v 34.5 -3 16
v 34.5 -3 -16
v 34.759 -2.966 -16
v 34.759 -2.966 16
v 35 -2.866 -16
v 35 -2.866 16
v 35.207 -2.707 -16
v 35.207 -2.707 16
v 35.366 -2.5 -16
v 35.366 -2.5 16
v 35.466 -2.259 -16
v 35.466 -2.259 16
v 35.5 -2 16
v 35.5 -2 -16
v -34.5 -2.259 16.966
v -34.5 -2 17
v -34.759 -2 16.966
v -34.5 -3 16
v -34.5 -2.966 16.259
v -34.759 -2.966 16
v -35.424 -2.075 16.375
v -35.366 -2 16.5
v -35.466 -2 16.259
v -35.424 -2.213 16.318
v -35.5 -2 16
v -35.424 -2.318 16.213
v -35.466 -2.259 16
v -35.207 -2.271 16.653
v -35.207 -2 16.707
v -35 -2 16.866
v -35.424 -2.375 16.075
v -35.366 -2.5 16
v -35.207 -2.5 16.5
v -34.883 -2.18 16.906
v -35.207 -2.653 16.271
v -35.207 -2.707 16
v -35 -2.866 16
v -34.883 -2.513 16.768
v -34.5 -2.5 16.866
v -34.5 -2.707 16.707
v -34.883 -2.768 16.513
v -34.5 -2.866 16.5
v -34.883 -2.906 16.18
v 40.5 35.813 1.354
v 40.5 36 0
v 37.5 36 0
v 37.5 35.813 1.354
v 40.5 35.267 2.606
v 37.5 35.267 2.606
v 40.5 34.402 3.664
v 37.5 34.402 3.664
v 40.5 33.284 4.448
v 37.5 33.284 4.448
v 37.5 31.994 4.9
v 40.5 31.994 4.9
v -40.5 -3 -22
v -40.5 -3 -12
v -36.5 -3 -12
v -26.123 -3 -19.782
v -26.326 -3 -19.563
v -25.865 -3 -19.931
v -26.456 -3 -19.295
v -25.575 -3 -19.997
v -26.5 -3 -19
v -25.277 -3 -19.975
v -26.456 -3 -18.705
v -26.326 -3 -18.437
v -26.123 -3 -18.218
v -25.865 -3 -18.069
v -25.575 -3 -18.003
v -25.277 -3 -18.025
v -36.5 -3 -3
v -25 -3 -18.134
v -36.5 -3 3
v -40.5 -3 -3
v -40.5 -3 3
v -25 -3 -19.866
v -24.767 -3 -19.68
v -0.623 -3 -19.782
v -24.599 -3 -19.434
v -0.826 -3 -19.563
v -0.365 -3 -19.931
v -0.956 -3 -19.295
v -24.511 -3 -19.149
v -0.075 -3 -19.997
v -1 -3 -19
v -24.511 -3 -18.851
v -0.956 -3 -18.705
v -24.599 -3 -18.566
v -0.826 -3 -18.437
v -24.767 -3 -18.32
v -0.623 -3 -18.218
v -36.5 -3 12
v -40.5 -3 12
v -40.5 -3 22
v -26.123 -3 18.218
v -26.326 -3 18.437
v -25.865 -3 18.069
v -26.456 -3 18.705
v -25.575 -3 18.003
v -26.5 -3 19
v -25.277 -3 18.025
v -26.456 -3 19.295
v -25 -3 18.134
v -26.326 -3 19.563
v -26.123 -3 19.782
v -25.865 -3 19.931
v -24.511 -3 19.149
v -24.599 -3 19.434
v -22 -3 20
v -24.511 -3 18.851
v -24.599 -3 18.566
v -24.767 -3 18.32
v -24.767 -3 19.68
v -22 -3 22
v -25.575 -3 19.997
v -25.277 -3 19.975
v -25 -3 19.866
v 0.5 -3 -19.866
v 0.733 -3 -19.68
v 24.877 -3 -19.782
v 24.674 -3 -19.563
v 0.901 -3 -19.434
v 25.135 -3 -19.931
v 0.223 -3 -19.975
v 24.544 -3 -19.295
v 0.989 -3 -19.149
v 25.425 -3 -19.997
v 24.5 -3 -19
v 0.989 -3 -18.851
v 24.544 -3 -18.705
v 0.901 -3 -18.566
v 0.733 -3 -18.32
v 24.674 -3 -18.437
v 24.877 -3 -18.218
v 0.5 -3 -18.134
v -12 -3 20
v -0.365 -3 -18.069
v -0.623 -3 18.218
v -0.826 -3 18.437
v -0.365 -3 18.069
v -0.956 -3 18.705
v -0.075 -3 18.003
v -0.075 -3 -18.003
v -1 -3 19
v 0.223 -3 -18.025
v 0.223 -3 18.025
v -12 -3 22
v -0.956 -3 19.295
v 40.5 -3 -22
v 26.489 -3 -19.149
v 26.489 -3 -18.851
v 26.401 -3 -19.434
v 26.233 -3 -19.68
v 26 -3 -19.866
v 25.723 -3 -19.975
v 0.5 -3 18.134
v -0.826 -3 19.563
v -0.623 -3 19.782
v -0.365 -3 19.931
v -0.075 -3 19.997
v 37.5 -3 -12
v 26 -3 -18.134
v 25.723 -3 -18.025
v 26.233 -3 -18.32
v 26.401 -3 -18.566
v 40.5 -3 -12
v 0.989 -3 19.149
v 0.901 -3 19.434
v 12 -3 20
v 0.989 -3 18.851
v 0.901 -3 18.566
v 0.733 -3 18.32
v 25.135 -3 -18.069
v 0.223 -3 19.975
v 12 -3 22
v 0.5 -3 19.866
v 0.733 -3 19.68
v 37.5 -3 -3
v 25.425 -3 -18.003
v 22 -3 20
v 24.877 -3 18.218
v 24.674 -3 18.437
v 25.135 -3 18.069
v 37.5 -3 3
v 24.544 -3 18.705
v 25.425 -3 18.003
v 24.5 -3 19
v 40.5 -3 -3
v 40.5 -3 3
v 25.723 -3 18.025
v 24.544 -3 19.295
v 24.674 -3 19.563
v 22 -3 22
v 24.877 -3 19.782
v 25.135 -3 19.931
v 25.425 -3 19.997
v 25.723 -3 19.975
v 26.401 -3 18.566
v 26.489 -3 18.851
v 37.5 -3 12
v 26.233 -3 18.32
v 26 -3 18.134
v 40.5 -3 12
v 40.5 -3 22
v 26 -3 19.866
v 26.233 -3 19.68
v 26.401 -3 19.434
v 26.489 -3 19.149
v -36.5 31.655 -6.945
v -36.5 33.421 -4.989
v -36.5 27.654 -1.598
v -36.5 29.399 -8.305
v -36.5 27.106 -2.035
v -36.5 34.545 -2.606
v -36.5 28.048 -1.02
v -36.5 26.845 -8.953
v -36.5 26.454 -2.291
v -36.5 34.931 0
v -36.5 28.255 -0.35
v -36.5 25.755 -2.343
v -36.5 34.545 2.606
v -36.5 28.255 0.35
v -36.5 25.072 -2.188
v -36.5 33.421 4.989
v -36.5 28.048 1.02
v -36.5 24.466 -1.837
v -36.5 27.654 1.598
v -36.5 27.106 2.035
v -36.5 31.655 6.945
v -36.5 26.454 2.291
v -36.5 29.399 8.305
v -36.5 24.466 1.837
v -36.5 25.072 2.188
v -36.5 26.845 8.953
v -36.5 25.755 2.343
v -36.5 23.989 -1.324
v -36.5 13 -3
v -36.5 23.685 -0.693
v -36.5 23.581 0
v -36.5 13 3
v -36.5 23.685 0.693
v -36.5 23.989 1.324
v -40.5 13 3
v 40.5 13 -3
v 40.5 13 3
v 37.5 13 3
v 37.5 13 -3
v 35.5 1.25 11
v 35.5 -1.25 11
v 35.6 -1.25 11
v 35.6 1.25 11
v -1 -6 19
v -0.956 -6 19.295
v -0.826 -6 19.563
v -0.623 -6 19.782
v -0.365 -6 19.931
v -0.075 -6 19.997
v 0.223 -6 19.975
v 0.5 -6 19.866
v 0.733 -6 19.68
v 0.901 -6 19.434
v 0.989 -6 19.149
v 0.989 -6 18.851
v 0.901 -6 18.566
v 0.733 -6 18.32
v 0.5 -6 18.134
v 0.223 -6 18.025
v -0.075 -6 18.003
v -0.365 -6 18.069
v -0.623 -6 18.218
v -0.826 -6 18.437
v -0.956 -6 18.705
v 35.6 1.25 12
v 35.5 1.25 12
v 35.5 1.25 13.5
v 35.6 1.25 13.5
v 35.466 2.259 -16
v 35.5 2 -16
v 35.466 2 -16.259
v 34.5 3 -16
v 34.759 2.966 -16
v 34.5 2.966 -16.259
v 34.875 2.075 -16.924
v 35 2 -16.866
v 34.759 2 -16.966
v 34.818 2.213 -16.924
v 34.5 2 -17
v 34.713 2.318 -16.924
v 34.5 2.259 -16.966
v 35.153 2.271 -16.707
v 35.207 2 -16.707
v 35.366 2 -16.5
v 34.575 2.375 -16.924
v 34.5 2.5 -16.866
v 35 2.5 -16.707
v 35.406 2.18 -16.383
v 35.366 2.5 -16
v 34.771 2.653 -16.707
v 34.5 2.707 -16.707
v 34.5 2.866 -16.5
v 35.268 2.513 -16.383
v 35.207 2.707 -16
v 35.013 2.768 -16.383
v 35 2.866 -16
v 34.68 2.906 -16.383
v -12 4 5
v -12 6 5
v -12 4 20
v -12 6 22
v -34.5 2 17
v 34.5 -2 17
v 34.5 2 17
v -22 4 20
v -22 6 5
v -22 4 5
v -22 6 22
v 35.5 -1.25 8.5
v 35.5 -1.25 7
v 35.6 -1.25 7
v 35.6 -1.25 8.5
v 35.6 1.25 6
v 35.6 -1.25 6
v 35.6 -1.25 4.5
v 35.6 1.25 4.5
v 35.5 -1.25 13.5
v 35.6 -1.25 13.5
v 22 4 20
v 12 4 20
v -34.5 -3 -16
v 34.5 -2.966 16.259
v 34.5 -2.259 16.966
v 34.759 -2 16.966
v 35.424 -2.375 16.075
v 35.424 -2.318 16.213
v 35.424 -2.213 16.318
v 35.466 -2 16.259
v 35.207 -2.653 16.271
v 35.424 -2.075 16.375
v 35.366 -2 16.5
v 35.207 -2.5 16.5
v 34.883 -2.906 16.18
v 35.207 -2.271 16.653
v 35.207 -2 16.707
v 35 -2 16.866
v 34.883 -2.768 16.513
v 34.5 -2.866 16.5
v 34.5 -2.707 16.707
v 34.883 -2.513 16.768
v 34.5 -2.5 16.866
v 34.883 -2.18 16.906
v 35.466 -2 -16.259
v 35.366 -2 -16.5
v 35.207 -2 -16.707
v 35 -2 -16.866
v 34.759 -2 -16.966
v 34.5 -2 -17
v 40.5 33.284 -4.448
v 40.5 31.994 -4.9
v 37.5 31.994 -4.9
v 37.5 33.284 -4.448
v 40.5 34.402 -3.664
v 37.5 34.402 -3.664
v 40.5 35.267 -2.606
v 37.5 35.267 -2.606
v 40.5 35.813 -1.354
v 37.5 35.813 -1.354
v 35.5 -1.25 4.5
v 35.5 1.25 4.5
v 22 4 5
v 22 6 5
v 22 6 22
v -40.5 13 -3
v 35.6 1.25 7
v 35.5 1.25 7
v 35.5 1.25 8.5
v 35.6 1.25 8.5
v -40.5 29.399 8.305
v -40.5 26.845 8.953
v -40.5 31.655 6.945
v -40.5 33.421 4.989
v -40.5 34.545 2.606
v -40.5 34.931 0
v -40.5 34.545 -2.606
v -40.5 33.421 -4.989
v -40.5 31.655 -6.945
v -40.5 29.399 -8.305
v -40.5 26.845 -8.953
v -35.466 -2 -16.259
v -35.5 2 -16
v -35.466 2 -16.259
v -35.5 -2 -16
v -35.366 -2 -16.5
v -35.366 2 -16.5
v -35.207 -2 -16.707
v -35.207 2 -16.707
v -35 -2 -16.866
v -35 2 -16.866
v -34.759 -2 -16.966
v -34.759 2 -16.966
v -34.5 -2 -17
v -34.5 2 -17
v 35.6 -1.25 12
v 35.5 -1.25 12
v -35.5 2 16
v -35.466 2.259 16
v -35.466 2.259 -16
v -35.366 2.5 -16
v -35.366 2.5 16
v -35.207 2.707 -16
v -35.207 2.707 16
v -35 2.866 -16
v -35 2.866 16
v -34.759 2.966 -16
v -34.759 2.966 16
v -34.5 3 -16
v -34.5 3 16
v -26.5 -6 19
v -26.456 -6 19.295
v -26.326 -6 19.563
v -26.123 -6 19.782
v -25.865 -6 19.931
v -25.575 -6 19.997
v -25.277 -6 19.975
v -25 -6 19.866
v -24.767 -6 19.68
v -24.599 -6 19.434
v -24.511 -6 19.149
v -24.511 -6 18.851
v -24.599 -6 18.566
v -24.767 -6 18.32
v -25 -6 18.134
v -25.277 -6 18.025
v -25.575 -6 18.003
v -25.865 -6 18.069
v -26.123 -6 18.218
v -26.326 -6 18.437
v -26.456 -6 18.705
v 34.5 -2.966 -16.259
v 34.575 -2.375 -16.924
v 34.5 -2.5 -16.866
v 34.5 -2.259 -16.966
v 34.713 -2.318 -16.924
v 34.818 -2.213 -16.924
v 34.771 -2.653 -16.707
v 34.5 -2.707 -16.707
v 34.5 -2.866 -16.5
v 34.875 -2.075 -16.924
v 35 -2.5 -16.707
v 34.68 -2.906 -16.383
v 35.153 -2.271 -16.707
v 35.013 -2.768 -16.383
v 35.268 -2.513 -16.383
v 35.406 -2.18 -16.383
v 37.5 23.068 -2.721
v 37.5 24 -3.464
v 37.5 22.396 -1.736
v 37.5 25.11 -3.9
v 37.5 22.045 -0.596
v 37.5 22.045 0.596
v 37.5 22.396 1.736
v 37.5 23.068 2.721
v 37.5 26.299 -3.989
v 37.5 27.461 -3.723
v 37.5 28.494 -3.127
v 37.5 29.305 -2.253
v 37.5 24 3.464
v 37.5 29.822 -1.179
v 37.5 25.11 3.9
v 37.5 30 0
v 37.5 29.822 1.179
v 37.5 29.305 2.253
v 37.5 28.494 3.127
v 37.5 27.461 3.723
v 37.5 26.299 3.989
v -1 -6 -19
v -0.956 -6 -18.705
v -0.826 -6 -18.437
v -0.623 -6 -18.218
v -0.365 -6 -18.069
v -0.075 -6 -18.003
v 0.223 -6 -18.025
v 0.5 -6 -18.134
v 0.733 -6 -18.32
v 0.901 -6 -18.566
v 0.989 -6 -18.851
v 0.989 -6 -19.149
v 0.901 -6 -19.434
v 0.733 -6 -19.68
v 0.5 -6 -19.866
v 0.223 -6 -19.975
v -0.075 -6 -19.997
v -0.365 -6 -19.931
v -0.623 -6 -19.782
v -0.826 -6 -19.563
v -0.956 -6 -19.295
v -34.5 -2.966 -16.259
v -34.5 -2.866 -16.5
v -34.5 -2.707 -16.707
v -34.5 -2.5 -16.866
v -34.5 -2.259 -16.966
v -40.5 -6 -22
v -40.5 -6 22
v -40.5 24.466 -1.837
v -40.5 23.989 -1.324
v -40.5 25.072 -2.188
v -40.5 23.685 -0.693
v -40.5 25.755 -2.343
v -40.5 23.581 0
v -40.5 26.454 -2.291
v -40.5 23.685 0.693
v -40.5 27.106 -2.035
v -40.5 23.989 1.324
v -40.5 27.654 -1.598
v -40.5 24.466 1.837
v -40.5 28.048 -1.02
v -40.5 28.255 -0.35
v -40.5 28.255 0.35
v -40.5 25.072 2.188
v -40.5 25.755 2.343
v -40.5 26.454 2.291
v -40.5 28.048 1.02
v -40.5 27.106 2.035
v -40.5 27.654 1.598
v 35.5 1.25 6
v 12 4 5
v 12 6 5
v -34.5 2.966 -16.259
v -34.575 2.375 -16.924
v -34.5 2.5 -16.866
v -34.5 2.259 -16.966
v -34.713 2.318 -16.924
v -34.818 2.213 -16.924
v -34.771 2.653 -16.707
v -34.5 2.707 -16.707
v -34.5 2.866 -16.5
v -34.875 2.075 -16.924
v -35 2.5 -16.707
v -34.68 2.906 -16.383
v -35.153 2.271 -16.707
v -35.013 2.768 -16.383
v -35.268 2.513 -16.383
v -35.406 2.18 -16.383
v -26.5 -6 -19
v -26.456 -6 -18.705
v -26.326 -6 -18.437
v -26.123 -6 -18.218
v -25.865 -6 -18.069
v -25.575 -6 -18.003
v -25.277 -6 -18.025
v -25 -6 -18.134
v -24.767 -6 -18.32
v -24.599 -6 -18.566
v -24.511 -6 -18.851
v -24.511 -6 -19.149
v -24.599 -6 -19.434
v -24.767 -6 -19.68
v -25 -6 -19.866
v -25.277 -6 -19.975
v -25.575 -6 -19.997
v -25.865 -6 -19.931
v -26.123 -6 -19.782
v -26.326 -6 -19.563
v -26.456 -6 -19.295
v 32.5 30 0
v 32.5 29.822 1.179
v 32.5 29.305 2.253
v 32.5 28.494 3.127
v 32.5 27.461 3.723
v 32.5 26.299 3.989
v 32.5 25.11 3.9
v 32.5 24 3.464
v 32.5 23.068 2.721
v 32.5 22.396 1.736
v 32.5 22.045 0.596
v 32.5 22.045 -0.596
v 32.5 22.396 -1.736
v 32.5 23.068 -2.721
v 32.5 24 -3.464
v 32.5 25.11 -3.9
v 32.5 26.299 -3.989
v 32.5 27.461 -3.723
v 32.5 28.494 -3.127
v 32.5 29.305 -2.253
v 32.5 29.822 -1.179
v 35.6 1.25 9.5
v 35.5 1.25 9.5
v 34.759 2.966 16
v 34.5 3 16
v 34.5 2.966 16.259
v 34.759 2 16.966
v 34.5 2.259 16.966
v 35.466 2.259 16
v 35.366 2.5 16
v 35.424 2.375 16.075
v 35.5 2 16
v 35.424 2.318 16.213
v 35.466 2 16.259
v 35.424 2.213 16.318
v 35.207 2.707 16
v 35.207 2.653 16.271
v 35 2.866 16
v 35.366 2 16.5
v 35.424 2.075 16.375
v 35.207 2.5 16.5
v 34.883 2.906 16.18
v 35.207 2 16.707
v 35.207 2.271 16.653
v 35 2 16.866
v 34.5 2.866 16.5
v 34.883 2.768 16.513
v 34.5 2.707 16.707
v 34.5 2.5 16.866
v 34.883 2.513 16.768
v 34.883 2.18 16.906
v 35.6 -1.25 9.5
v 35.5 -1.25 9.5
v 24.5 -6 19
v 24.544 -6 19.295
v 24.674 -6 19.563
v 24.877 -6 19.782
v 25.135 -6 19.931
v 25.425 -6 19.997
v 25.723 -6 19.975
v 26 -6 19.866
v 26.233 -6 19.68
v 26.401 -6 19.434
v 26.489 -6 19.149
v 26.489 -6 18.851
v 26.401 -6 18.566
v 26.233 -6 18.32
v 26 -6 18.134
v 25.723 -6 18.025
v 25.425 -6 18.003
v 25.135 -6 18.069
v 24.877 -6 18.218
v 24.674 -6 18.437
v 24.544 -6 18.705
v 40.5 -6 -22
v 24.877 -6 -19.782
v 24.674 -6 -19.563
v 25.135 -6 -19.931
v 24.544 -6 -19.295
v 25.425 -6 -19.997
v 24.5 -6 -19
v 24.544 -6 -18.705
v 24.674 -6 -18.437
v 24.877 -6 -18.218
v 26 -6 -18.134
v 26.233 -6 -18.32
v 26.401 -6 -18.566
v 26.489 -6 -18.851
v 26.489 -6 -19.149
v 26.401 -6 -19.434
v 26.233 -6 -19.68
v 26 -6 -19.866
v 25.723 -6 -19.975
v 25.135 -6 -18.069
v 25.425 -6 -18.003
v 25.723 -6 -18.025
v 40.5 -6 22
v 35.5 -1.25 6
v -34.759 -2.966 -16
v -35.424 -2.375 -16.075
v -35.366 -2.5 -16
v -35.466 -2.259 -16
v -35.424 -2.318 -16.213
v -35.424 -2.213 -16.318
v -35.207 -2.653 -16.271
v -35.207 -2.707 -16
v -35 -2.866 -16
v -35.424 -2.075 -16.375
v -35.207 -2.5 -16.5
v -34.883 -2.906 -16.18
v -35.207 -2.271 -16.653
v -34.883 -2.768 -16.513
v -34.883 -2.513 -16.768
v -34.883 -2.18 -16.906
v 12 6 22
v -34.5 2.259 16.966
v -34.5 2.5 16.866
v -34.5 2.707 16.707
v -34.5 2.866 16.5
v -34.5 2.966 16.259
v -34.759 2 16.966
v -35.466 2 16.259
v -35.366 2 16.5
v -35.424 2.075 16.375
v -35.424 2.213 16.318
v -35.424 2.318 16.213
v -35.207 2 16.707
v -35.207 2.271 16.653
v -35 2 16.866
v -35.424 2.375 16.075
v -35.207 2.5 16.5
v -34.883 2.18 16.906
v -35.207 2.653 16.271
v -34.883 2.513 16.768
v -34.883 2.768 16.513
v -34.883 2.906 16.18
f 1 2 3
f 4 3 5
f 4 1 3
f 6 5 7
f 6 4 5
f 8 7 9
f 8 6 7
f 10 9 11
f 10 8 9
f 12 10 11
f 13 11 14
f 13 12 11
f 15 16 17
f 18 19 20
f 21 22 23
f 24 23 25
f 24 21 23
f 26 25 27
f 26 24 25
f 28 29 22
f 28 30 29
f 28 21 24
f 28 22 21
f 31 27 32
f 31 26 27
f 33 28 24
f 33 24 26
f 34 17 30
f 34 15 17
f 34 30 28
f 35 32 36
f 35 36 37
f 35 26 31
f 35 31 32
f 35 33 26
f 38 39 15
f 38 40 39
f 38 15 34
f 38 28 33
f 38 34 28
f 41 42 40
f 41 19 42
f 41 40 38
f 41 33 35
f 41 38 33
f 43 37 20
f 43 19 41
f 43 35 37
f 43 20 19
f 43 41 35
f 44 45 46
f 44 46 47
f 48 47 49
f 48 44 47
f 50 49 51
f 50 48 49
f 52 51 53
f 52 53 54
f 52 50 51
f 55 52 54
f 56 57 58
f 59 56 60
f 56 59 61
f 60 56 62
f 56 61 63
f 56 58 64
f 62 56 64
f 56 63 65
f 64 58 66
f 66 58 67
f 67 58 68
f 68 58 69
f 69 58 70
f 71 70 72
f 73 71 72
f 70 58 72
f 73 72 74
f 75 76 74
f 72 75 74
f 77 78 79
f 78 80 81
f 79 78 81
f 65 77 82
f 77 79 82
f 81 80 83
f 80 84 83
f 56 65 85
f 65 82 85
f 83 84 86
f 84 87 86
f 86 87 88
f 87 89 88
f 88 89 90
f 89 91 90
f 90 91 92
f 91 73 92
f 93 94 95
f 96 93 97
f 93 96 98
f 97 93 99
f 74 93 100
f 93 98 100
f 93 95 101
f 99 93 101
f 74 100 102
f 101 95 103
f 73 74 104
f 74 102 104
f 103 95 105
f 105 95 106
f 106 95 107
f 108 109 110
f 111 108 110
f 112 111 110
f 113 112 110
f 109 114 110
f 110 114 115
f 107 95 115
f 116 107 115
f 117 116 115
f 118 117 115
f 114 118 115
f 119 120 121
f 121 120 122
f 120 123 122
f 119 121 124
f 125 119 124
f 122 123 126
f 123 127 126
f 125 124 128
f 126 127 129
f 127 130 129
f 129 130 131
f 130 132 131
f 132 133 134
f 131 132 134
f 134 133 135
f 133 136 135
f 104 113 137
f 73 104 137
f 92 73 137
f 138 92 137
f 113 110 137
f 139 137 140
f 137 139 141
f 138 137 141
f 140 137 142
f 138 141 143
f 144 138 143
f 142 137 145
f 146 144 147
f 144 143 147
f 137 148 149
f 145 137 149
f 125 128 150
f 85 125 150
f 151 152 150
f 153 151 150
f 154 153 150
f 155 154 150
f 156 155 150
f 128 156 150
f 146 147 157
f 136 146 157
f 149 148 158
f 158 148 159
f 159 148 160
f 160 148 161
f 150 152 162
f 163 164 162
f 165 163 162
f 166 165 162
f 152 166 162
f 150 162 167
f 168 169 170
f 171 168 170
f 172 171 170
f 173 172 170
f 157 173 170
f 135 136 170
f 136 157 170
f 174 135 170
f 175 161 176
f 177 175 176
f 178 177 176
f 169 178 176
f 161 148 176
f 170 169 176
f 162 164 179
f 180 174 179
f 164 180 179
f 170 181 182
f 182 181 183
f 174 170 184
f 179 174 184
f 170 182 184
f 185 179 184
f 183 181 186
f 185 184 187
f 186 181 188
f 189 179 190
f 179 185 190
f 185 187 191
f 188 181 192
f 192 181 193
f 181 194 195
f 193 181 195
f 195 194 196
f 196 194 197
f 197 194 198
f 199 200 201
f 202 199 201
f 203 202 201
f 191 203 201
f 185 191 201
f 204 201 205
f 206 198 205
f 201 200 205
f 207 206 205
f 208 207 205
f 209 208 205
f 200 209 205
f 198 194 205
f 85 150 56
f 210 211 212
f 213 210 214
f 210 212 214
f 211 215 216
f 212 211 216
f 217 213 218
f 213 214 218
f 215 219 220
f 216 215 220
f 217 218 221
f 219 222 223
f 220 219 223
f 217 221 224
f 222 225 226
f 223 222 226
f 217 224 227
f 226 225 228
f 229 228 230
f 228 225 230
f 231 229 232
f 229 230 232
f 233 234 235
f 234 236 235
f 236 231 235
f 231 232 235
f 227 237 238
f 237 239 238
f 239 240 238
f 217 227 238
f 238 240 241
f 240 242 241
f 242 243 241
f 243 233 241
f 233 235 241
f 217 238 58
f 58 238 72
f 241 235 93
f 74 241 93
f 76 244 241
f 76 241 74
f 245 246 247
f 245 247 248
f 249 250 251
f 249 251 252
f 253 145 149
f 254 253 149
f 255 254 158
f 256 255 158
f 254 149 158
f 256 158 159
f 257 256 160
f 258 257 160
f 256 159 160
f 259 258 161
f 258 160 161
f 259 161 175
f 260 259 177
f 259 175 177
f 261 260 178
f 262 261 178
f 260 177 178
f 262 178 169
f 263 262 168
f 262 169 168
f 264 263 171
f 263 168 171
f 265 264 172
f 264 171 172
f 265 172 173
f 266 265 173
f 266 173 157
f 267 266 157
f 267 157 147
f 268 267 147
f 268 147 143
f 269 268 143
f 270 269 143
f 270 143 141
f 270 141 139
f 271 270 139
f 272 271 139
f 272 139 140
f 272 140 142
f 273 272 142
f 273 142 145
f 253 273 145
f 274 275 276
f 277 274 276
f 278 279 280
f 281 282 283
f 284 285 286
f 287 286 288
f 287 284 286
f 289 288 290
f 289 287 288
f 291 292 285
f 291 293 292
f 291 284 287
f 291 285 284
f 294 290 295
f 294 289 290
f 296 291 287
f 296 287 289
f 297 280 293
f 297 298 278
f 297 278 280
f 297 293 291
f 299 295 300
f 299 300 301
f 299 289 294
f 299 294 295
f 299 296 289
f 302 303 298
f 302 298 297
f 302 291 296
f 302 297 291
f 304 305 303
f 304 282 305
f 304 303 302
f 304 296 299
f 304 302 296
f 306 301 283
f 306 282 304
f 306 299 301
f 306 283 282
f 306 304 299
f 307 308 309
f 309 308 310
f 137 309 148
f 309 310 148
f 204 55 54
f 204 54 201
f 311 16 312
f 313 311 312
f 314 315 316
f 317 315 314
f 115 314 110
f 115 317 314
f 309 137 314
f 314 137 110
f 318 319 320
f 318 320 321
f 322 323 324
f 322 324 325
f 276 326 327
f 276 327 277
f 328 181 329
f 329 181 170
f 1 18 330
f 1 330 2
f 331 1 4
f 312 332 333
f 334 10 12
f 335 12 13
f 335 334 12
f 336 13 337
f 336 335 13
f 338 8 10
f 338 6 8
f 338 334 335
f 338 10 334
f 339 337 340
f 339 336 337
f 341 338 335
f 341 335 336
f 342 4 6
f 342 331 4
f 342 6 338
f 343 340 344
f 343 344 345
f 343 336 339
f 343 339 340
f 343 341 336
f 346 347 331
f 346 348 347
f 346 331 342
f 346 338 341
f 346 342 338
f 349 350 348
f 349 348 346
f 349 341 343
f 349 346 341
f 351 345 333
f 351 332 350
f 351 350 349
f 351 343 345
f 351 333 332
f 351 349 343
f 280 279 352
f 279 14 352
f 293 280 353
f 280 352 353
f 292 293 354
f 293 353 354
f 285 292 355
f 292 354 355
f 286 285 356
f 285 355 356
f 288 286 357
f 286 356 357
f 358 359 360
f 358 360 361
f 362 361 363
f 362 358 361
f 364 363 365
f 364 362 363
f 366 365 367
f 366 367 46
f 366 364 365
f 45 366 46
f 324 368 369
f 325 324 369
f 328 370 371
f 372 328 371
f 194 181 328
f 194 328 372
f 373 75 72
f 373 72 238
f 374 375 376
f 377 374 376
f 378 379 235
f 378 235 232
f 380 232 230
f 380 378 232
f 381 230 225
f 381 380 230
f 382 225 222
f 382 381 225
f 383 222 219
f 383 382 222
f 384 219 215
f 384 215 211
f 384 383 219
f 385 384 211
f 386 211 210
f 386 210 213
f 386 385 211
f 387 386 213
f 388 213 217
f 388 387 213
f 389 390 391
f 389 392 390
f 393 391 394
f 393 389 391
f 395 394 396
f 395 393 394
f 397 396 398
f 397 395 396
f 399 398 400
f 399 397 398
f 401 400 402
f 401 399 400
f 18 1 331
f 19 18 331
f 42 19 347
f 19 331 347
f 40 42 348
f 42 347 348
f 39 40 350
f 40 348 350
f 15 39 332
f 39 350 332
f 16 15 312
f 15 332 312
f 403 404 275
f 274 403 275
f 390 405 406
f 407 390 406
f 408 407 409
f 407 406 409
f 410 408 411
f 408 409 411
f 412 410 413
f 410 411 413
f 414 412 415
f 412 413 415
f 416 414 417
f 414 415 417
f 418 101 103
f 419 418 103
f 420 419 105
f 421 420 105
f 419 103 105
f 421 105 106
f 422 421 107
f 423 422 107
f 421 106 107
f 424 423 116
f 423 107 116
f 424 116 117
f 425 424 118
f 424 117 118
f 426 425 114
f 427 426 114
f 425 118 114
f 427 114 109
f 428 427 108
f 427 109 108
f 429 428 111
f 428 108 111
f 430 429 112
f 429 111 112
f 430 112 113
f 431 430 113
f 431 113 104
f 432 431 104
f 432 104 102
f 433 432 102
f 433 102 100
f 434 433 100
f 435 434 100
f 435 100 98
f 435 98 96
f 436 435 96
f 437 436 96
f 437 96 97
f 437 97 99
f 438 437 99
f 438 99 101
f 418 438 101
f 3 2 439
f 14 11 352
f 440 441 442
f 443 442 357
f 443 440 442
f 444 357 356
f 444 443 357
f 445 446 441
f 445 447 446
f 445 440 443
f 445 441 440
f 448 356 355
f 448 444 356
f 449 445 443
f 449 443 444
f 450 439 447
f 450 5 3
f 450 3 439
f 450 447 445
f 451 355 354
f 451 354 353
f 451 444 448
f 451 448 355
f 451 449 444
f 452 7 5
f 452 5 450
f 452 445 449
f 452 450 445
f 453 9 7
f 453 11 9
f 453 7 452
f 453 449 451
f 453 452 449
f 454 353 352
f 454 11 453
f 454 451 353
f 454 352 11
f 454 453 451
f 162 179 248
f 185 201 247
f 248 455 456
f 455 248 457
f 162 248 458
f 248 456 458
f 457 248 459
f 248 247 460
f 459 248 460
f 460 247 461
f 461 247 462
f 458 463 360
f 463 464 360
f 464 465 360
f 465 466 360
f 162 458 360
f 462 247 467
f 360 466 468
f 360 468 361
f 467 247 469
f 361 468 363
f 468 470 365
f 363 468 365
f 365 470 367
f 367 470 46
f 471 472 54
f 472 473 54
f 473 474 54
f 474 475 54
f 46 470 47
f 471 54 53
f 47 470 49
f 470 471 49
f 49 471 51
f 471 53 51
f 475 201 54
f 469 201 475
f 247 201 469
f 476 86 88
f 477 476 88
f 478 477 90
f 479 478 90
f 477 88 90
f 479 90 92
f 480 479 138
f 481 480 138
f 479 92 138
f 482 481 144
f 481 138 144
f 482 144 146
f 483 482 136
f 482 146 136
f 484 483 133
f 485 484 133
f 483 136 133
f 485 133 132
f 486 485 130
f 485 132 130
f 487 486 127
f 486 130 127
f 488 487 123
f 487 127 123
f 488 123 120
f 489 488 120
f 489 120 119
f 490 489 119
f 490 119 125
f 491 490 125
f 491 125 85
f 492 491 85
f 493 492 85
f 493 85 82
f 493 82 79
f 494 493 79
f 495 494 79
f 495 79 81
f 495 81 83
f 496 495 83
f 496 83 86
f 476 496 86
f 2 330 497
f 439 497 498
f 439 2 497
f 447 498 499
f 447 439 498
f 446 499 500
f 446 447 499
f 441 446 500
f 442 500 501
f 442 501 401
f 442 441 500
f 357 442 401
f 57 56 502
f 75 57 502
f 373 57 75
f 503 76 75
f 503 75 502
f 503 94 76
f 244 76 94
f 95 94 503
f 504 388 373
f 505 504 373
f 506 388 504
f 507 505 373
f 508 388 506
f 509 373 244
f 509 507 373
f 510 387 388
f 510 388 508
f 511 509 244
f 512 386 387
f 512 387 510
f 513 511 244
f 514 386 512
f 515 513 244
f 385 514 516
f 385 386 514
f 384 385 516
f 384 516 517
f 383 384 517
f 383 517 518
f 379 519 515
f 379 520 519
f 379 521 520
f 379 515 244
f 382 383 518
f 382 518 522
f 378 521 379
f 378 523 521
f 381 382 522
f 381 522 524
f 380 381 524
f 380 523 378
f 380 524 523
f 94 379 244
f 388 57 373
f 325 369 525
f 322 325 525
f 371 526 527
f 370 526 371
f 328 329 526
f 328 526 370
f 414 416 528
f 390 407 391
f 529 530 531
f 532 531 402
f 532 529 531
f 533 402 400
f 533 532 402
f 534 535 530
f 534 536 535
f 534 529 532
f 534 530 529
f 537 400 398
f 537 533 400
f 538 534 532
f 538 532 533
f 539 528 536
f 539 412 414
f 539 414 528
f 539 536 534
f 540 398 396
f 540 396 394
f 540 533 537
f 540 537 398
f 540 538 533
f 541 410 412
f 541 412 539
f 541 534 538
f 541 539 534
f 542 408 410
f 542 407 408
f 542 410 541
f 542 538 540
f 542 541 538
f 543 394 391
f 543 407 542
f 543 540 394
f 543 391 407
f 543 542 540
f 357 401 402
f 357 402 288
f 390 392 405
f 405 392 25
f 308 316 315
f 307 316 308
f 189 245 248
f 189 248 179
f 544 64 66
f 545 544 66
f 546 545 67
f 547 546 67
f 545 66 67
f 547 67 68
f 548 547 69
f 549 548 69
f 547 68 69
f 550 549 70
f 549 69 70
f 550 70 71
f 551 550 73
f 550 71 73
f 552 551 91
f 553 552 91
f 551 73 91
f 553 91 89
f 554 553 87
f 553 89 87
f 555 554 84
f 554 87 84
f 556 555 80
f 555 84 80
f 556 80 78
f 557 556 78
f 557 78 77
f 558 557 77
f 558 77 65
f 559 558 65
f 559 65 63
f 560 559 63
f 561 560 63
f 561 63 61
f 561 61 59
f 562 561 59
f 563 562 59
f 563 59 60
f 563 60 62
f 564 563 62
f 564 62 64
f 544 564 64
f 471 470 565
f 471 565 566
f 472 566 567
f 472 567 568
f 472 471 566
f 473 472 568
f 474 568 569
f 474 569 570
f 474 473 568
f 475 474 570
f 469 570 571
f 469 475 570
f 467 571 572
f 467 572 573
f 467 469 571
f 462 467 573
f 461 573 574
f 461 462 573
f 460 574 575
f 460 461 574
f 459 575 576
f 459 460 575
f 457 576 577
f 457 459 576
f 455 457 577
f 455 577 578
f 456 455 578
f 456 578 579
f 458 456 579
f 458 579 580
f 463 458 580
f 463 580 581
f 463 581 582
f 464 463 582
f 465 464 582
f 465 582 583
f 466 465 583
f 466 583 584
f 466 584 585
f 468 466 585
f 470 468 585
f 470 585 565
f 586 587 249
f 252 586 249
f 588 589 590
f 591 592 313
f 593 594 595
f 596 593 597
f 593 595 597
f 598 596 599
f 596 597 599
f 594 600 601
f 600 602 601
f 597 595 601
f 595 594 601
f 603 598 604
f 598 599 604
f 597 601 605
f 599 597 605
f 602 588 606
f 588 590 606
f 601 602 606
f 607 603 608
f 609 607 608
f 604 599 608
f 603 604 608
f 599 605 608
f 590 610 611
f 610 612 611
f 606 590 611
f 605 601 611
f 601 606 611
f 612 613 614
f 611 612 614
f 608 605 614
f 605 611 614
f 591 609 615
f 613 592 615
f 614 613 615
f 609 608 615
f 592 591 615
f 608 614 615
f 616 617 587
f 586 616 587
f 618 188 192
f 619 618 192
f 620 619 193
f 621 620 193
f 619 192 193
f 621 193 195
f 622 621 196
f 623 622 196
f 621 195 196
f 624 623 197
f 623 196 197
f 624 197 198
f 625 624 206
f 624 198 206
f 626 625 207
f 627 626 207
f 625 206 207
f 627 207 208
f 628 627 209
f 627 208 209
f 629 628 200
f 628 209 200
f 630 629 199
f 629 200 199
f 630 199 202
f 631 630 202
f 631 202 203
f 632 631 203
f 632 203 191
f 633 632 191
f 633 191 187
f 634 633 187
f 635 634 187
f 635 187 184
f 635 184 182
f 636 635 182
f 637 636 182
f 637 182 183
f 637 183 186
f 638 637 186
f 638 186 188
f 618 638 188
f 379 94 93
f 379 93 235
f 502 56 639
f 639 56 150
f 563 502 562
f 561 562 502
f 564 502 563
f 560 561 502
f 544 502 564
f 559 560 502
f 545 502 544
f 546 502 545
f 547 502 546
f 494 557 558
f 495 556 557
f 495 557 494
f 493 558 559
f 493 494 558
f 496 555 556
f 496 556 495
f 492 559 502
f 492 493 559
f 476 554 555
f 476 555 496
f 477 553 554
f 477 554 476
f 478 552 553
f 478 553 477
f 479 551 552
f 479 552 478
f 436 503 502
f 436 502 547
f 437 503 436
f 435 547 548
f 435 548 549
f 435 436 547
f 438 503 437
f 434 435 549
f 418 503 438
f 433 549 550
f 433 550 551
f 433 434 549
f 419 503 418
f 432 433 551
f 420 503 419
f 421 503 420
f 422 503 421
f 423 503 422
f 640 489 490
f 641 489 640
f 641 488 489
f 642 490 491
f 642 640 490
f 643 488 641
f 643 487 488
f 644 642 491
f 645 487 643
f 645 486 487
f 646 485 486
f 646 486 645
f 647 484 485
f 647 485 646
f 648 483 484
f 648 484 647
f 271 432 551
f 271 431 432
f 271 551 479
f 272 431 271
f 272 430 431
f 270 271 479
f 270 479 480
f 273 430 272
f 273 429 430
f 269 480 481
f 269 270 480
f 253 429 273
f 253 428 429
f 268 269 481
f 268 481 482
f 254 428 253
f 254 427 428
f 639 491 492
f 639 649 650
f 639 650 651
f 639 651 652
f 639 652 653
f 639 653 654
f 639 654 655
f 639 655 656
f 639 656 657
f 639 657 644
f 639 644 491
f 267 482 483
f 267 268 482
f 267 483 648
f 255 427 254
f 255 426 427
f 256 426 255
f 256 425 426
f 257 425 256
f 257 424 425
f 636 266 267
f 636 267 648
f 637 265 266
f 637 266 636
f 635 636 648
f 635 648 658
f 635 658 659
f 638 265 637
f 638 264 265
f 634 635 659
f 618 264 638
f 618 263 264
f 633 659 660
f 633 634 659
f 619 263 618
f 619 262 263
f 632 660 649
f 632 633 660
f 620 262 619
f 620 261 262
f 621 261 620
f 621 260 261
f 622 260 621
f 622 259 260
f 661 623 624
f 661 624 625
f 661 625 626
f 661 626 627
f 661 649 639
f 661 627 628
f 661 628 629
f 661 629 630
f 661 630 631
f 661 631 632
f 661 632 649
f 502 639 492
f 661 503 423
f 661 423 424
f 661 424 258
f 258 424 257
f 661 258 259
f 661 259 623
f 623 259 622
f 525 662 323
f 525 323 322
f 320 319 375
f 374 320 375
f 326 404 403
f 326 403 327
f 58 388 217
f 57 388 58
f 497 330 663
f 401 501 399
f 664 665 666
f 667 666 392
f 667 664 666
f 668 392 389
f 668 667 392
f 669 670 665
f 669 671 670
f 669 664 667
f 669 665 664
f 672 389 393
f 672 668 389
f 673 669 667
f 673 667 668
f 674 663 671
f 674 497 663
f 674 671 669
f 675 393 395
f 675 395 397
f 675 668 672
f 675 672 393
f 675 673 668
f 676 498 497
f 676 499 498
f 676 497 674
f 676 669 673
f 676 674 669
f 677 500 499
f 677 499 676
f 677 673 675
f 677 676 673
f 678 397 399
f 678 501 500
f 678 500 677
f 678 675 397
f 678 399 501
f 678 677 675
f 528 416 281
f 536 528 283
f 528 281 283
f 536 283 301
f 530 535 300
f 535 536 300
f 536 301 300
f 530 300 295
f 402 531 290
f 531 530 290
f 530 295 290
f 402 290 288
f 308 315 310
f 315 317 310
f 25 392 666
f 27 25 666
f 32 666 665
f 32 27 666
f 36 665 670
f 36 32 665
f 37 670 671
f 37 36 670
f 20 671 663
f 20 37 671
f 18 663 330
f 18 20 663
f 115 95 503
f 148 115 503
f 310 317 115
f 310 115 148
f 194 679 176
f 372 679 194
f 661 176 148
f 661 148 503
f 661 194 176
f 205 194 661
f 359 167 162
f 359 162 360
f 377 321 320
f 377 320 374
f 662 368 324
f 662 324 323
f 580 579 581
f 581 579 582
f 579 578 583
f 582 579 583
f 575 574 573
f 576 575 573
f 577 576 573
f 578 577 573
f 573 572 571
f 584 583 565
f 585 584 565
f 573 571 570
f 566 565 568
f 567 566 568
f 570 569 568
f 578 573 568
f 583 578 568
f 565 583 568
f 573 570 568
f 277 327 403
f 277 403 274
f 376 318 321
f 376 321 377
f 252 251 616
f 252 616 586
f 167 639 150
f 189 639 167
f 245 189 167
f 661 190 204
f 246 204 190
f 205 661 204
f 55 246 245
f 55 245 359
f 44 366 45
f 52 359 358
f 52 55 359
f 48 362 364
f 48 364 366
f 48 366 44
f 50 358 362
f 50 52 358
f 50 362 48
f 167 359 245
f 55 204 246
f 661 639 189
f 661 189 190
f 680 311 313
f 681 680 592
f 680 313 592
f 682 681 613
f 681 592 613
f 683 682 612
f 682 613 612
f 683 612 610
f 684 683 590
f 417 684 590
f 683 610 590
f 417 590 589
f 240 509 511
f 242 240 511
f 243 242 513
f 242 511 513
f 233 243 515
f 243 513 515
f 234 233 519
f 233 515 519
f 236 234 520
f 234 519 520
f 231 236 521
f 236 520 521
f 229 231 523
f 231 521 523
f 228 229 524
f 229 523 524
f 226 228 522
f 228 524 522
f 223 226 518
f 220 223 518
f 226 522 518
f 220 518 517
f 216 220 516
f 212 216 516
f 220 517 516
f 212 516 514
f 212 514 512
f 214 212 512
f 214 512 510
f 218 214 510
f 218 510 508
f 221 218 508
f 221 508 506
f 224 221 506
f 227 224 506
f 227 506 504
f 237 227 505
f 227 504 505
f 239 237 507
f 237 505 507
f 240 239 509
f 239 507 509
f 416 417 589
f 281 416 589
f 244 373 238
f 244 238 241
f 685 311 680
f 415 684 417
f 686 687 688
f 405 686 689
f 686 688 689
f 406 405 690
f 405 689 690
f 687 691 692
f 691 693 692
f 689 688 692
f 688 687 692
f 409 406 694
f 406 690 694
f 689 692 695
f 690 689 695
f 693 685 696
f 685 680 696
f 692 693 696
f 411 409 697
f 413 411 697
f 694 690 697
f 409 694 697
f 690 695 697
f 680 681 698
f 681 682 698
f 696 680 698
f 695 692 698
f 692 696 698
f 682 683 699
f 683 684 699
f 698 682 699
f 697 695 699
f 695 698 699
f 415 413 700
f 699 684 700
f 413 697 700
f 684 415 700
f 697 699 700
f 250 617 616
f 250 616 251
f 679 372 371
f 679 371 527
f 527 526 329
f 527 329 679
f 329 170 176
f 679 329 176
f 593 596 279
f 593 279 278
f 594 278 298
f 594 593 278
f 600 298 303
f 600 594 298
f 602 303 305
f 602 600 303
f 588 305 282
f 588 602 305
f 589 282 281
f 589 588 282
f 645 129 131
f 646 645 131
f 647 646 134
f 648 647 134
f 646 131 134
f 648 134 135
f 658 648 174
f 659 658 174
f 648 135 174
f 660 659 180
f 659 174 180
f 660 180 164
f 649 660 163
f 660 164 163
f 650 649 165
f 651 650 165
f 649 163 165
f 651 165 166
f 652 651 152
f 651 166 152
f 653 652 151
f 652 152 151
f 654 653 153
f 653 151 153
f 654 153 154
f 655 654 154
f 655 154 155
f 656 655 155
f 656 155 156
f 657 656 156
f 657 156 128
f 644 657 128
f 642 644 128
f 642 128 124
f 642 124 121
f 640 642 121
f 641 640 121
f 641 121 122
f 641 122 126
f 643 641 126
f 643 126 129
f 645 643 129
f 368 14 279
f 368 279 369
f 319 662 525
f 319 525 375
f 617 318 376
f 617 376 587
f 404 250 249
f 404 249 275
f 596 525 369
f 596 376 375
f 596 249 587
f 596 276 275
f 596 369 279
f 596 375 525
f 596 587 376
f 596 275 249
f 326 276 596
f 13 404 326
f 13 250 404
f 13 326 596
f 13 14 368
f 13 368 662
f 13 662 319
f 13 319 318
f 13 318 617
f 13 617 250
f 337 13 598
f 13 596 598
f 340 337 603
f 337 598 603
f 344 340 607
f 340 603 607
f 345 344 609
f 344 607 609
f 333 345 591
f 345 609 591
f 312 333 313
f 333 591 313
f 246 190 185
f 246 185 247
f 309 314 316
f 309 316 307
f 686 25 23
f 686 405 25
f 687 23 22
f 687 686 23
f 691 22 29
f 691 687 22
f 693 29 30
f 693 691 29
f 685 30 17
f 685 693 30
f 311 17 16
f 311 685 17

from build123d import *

# Parameters (mm, degrees)
F0_W      = 71
F0_H      = 34
F1_DEPTH  = 3
F2_R      = 1
F3_W      = 2.5
F3_H      = 1.5
F4_DEPTH  = 0.1
F5_W      = 81
F5_H      = 44
F6_DEPTH  = 3
F7_R      = 2.35
F8_DEPTH  = 4
F10_DEPTH = 3
F11_R     = 4
F12_DEPTH = 8
F13_W     = 10
F13_H     = 2
F14_DEPTH = 9
F15_W     = 10
F15_H     = 2
F16_DEPTH = 15
F17_R     = 1
F18_DEPTH = 25


with BuildPart() as f1:
    # F0 (on Front) → F1 (new body, symmetric)
    with BuildSketch(Plane.XZ):
        Rectangle(F0_W, F0_H)
    extrude(amount=F1_DEPTH, both=True)

    # F2
    f2_edges = [f1.edges().sort_by_distance(p)[0] for p in [
        (0, -3, 17),
        (0, 3, 17),
        (35.5, -3, 0),
        (35.5, 3, 0),
        (0, -3, -17),
        (35.5, 0, -17),
        (-35.5, 0, 17),
        (-35.5, -3, 0),
        (-35.5, 3, 0),
        (0, 3, -17),
        (-35.5, 0, -17),
        (35.5, 0, 17),
    ]]
    fillet(f2_edges, radius=F2_R)

    # F3 (on face) → F4 (join)
    with BuildSketch(Plane.YZ.offset(35.5)):
        with Locations((0, 12.75)):
            Rectangle(F3_W, F3_H)
        with Locations((0, 10.25)):
            Rectangle(F3_W, F3_H)
        with Locations((0, 7.75)):
            Rectangle(F3_W, F3_H)
        with Locations((0, 5.25)):
            Rectangle(F3_W, F3_H)
    extrude(amount=F4_DEPTH)


with BuildPart() as f6:
    # F5 (on face) → F6 (new body)
    with BuildSketch(Plane.XZ.offset(3)):
        Rectangle(F5_W, F5_H)
    extrude(amount=F6_DEPTH)

    # F7 (on face) → F8 (join)
    with BuildSketch(Plane(origin=(-40.5, 0, 0), x_dir=(0, -1, 0), z_dir=(-1, 0, 0))):
        with BuildLine():
            ThreePointArc((-26.84491, -8.953473), (-19.898773, -6.679282), (-16.930952, 0))
            ThreePointArc((-16.930952, 0), (-19.898773, 6.679282), (-26.84491, 8.953473))
            ThreePointArc((-26.84491, 8.953473), (-34.930952, 0), (-26.84491, -8.953473))
        make_face()
        with Locations((-25.930952, 0)):
            Circle(F7_R, mode=Mode.SUBTRACT)
        with BuildLine():
            ThreePointArc((-26.84491, 8.953473), (-19.898773, 6.679282), (-16.930952, 0))
            ThreePointArc((-16.930952, 0), (-19.898773, -6.679282), (-26.84491, -8.953473))
            Line((-26.84491, -8.953473), (3, -12))
            Line((3, -12), (3, -3))
            Line((3, -3), (-13, -3))
            Line((-13, -3), (-13, 3))
            Line((-13, 3), (3, 3))
            Line((3, 3), (3, 12))
            Line((3, 12), (-26.84491, 8.953473))
        make_face()
    extrude(amount=-F8_DEPTH)

    # F9 (on face) → F10 (join)
    with BuildSketch(Plane.YZ.offset(40.5)):
        with BuildLine():
            ThreePointArc((31.994176, -4.900165), (34.871103, -3.164579), (36, 0))
            ThreePointArc((36, 0), (34.871103, 3.164579), (31.994176, 4.900165))
            ThreePointArc((31.994176, 4.900165), (26, 0), (31.994176, -4.900165))
        make_face()
        with BuildLine():
            ThreePointArc((31.994176, -4.900165), (26, 0), (31.994176, 4.900165))
            Line((31.994176, 4.900165), (-3, 12))
            Line((-3, 12), (-3, 3))
            Line((-3, 3), (13, 3))
            Line((13, 3), (13, -3))
            Line((13, -3), (-3, -3))
            Line((-3, -3), (-3, -12))
            Line((-3, -12), (31.994176, -4.900165))
        make_face()
    extrude(amount=-F10_DEPTH)

    # F11 (on face) → F12 (join)
    with BuildSketch(Plane.YZ.offset(40.5)):
        with Locations((26, 0)):
            Circle(F11_R)
    extrude(amount=-F12_DEPTH)

    # F13 (on face) → F14 (join)
    with BuildSketch(Plane(origin=(0, -3, 0), x_dir=(-1, 0, 0), z_dir=(0, 1, 0))):
        with Locations((17, 21)):
            Rectangle(F13_W, F13_H)
        with Locations((-17, 21)):
            Rectangle(F13_W, F13_H)
    extrude(amount=F14_DEPTH)

    # F15 (on face) → F16 (join)
    with BuildSketch(Plane(origin=(0, 0, 20), x_dir=(1, 0, 0), z_dir=(0, 0, -1))):
        with Locations((-17, -5)):
            Rectangle(F15_W, F15_H)
        with Locations((17, -5)):
            Rectangle(F15_W, F15_H)
    extrude(amount=F16_DEPTH)

    # F17 (on face) → F18 (cut)
    with BuildSketch(Plane(origin=(0, -3, 0), x_dir=(-1, 0, 0), z_dir=(0, 1, 0))):
        with Locations((25.5, 19)):
            Circle(F17_R)
        with Locations((25.5, -19)):
            Circle(F17_R)
        with Locations((-25.5, 19)):
            Circle(F17_R)
        with Locations((-25.5, -19)):
            Circle(F17_R)
        with Locations((0, -19)):
            Circle(F17_R)
        with Locations((0, 19)):
            Circle(F17_R)
    extrude(amount=-F18_DEPTH, mode=Mode.SUBTRACT)


solid = Compound([f1.part, f6.part])
